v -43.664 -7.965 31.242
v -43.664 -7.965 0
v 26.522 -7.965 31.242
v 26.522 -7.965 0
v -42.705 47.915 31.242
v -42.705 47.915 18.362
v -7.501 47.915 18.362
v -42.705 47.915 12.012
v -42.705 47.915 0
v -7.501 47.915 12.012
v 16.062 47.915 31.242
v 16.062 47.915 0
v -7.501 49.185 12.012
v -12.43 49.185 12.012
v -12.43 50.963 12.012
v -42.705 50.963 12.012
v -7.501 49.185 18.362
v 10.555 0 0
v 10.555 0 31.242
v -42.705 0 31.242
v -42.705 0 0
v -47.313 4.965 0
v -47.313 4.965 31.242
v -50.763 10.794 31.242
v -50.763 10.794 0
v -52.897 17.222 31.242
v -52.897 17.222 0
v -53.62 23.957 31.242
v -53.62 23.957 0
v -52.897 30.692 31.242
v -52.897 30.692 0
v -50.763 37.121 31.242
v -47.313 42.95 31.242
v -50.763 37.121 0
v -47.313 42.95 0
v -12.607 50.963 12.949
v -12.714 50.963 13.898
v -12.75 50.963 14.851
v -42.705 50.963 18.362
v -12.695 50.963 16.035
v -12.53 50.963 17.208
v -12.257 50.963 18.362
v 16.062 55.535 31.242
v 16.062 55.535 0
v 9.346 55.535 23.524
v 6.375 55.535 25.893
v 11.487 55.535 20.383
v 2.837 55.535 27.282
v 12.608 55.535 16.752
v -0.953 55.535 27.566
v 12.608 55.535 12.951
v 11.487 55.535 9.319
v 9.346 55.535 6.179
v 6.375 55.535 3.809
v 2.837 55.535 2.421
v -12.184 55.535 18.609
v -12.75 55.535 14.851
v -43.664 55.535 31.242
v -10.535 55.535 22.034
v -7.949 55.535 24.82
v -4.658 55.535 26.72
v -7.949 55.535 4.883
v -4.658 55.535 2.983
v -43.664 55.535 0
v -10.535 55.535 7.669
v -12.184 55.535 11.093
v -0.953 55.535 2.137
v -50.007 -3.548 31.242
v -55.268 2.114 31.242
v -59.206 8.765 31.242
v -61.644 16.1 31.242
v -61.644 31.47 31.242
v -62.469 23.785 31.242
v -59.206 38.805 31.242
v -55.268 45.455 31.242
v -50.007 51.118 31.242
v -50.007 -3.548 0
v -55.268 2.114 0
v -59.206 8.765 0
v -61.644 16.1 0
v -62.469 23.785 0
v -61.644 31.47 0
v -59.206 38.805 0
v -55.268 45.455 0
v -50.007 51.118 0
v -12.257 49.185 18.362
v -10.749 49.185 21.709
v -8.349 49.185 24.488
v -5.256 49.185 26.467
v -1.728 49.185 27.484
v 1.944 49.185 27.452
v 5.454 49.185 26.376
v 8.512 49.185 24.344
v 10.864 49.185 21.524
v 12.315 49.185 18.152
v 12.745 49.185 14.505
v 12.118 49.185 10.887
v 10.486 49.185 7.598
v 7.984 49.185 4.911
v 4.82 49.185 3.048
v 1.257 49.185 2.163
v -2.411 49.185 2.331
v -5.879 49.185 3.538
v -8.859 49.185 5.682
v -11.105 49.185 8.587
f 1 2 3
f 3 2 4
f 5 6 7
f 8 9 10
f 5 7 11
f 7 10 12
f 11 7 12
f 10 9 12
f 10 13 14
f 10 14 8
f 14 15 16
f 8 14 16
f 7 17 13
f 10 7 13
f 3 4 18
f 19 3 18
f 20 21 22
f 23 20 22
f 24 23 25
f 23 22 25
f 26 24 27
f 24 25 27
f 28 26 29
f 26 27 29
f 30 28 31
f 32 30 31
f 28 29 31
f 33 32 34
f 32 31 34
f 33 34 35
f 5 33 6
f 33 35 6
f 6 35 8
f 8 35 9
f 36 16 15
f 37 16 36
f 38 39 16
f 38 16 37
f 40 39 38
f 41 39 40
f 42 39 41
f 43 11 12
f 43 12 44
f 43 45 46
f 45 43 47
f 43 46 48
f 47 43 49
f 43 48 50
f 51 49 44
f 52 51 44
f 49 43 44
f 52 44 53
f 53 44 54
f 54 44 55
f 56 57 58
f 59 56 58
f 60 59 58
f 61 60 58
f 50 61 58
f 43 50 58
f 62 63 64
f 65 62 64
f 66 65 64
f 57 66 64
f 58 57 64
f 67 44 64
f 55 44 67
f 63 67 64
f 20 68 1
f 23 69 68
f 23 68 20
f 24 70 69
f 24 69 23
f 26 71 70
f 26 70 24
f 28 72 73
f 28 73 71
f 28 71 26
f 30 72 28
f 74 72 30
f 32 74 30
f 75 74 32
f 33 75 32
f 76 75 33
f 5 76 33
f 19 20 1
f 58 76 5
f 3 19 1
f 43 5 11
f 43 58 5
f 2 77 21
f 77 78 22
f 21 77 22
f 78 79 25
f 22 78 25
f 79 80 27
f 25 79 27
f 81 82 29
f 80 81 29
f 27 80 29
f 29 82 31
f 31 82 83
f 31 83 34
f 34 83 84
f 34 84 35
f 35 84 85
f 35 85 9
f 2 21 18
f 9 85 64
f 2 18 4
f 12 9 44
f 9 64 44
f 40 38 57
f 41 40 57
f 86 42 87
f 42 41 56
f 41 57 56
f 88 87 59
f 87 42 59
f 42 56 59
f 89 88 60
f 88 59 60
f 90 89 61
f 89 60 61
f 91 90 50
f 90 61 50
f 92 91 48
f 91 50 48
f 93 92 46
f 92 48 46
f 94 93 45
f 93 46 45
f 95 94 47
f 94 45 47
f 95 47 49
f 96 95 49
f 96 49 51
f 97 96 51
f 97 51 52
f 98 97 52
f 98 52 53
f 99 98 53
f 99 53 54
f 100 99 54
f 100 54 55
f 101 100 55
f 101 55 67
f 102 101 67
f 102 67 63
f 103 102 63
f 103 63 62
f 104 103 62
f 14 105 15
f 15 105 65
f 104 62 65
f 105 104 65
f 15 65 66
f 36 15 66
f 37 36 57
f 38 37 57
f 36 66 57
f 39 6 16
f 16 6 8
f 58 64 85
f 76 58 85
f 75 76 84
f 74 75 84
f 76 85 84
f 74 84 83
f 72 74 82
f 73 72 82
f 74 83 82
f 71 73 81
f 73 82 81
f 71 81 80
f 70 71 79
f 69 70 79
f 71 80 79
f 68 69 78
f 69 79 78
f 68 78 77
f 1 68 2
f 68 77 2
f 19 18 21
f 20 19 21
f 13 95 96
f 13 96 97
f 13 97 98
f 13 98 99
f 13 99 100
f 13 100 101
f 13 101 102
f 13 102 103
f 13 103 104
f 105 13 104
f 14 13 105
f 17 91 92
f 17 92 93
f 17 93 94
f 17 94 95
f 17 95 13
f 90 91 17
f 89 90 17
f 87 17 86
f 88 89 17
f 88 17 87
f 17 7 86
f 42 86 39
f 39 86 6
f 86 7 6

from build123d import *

# Parameters (mm, degrees)
F1_DEPTH = 31.242
F2_R     = 12.75
F3_DEPTH = 6.35
F5_DEPTH = 25.4
F7_DEPTH = 3.048


with BuildPart() as f1:
    # F0 (on Top) → F1 (new body)
    with BuildSketch(Plane.XY):
        with BuildLine():
            Line((-43.664057, -7.965392), (16.06224, -7.965392))
            Line((16.06224, -7.965392), (26.521553, -7.965392))
            Line((26.521553, -7.965392), (10.554898, 0))
            Line((10.554898, 0), (-42.705316, 0))
            ThreePointArc((-42.705316, 0), (-53.620007, 23.957304), (-42.705316, 47.914608))
            Line((-42.705316, 47.914608), (16.06224, 47.914608))
            Line((16.06224, 47.914608), (16.06224, 55.534608))
            Line((16.06224, 55.534608), (-43.664057, 55.534608))
            ThreePointArc((-43.664057, 55.534608), (-62.468951, 23.784608), (-43.664057, -7.965392))
        make_face()
    extrude(amount=F1_DEPTH)

    # F2 (on face) → F3 (cut)
    with BuildSketch(Plane(origin=(0, 55.534608, 0), x_dir=(-1, 0, 0), z_dir=(0, 1, 0))):
        with Locations((0, 14.851301)):
            Circle(F2_R)
    extrude(amount=-F3_DEPTH, mode=Mode.SUBTRACT)

    # F4 (on face) → F5 (cut)
    with BuildSketch(Plane(origin=(0, 49.184608, 0), x_dir=(-1, 0, 0), z_dir=(0, 1, 0))):
        with BuildLine():
            ThreePointArc((12.75, 14.851301), (12.626213, 16.623652), (12.257258, 18.361589))
            Line((12.257258, 18.361589), (7.501453, 18.361589))
            Line((7.501453, 18.361589), (7.501453, 12.011589))
            Line((7.501453, 12.011589), (12.429744, 12.011589))
            ThreePointArc((12.429744, 12.011589), (12.669683, 13.422444), (12.75, 14.851301))
        make_face()
    extrude(amount=-F5_DEPTH, mode=Mode.SUBTRACT)

    # F6 (on face) → F7 (cut)
    with BuildSketch(Plane.XZ.offset(-47.914608)):
        Polygon((-12.429744, 12.011589), (-12.257258, 18.361589), (-42.705316, 18.361589), (-42.705316, 12.011589), align=None)
    extrude(amount=-F7_DEPTH, mode=Mode.SUBTRACT)


solid = f1.part
